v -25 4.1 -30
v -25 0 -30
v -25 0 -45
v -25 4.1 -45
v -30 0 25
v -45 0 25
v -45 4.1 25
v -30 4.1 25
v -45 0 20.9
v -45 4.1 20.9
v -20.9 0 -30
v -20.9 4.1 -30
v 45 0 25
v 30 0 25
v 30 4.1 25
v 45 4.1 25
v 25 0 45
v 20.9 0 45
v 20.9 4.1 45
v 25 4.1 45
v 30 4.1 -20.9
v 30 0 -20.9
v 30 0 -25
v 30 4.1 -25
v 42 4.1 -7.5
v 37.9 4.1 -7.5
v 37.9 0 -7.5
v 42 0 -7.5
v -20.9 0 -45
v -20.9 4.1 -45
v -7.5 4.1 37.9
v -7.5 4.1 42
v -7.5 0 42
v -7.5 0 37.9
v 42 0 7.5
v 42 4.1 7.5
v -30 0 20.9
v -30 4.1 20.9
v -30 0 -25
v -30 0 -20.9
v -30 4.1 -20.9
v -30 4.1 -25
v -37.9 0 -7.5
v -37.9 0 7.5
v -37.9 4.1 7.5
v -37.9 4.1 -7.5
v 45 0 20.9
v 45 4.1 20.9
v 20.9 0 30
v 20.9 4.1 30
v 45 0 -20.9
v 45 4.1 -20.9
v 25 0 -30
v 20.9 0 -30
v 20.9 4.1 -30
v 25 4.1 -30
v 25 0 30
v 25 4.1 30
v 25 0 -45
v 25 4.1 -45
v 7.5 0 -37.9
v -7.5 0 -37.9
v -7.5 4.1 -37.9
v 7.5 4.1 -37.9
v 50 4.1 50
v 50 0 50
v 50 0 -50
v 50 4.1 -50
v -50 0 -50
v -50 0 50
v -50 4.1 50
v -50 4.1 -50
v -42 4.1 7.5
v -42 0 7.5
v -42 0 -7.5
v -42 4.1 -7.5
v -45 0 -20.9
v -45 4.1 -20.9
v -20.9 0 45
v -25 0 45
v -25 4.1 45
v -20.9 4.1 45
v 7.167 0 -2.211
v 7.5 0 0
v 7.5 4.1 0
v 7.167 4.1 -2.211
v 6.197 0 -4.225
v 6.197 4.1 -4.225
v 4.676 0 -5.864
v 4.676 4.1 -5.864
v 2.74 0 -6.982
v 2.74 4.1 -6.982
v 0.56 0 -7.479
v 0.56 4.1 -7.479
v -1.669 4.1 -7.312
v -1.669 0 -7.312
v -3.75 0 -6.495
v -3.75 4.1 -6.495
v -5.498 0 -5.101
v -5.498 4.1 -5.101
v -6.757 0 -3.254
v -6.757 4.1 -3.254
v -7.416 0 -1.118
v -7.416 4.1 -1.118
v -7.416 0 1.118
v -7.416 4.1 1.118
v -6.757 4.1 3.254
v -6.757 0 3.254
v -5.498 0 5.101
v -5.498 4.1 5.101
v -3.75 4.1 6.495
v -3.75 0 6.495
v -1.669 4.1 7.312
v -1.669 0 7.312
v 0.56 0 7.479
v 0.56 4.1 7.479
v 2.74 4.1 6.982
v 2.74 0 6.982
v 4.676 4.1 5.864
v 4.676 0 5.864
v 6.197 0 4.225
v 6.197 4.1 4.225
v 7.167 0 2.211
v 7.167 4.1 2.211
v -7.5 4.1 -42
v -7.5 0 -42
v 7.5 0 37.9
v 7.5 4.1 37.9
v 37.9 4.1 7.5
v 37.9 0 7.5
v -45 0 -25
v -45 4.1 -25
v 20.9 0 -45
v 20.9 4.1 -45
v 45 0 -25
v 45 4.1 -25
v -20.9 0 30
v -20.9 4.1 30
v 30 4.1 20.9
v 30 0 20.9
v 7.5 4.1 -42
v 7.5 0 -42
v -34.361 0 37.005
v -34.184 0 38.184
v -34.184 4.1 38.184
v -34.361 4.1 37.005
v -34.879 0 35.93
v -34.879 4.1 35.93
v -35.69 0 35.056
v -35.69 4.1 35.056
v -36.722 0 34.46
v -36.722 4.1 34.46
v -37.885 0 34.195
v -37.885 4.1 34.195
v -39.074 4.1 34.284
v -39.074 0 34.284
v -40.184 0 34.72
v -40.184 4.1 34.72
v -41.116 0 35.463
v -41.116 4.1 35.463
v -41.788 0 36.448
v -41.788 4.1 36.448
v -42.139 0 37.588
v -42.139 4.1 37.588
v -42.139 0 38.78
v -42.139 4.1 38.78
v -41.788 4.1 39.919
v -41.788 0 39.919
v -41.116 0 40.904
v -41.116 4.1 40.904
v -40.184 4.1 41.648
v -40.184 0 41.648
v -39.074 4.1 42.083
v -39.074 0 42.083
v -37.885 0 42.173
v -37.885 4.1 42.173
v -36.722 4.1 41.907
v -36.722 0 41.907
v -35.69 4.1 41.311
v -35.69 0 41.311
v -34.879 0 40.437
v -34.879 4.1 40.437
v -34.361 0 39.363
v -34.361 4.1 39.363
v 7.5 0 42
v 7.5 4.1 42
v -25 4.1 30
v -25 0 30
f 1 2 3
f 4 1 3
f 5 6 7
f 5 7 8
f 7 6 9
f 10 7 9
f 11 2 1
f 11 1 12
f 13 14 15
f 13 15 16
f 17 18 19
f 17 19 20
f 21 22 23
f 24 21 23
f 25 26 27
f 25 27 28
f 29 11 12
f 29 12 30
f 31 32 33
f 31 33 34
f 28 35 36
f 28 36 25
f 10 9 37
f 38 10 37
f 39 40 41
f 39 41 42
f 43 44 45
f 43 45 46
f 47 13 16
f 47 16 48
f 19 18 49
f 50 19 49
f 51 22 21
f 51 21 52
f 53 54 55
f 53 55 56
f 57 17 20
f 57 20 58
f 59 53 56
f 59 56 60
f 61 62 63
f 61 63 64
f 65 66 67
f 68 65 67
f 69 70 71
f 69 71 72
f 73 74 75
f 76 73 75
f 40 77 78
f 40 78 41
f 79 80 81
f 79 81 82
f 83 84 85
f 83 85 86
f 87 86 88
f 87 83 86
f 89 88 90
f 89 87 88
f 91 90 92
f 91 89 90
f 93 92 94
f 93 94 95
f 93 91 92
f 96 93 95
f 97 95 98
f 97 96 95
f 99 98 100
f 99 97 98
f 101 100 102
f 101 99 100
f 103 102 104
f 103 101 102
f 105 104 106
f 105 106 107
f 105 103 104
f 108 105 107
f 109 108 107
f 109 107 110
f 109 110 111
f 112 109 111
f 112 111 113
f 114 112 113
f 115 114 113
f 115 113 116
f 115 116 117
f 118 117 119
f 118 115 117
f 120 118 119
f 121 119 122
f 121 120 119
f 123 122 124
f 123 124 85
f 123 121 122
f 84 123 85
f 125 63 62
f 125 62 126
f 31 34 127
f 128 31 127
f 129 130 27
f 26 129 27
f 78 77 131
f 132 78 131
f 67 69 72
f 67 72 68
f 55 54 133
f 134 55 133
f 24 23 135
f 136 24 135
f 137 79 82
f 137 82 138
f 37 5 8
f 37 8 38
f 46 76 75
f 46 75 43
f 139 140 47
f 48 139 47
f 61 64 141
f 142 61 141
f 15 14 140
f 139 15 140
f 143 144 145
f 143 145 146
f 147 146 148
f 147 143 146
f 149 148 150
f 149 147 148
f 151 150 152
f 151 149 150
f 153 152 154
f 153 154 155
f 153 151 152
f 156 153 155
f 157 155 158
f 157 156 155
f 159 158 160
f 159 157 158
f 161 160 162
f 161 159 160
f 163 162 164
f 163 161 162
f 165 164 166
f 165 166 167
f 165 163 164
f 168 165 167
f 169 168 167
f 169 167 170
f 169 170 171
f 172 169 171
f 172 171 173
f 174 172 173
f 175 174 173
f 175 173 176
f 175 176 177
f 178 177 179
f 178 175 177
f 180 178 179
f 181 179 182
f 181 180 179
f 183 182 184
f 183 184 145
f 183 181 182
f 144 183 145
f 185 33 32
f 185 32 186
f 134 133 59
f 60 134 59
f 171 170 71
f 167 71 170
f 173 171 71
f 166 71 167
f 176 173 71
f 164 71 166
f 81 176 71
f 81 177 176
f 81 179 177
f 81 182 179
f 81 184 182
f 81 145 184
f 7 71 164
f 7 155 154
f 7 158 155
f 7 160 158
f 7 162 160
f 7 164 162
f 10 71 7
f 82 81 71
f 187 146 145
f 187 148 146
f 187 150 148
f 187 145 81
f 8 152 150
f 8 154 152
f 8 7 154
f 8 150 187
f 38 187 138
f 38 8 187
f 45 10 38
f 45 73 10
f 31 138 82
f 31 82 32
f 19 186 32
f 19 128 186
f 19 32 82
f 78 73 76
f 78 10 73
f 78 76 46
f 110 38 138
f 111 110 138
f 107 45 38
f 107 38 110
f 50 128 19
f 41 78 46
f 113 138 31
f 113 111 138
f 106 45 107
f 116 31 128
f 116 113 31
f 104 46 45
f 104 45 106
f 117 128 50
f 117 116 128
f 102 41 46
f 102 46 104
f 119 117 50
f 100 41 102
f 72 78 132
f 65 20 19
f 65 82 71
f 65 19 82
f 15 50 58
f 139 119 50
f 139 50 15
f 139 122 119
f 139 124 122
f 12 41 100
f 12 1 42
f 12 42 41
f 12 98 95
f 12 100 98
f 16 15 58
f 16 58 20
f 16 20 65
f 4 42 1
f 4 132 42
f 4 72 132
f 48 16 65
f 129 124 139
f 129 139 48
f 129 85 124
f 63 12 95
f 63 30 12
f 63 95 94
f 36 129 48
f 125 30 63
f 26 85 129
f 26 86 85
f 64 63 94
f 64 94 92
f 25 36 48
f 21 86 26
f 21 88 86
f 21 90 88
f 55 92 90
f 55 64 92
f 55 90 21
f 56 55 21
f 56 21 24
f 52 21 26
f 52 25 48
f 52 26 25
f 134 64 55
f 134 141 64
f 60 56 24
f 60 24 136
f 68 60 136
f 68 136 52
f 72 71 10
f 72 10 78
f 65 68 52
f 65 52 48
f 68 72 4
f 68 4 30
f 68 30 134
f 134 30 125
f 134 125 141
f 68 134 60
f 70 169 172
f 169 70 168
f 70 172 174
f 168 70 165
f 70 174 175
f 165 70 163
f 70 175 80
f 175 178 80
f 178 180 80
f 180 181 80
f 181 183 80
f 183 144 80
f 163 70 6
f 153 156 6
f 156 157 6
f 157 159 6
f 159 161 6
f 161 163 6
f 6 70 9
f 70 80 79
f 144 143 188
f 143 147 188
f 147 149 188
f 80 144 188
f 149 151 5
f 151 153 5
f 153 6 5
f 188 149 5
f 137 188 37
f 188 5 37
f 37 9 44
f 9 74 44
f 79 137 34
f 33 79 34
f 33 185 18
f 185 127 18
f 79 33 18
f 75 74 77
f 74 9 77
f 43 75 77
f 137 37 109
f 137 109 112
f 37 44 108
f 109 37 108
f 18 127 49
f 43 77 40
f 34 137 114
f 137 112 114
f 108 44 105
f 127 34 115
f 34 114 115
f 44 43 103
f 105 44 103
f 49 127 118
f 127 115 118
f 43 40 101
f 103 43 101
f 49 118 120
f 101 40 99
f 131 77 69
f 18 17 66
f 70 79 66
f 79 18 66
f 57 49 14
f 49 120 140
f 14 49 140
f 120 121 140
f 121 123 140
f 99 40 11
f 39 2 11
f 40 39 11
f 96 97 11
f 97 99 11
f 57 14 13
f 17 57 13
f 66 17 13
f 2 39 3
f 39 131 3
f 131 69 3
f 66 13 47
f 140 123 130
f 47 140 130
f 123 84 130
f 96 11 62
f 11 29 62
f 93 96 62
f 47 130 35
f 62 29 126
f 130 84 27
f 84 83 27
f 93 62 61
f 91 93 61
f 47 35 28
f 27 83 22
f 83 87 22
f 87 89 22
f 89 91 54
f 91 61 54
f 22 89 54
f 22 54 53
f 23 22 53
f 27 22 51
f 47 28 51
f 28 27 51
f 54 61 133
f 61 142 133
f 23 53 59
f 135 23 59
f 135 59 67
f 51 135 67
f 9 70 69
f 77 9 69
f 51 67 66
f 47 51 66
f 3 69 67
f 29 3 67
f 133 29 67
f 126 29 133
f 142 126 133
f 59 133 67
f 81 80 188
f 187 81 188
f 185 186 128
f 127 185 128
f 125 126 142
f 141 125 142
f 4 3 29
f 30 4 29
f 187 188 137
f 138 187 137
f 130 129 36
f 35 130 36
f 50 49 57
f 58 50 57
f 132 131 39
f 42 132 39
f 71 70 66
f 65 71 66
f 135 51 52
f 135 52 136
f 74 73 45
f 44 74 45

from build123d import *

# Parameters (mm, degrees)
SKETCH1_W           = 100
SKETCH1_H           = 100
SKETCH1_R           = 7.5
SKETCH1_R_2         = 4
SKETCH1_W_2         = 4.1
SKETCH1_H_2         = 15
SKETCH1_W_3         = 15
SKETCH1_H_3         = 4.1
BOSS_EXTRUDE1_DEPTH = 4.1


with BuildPart() as part:
    # Sketch1 → Boss-Extrude1 (new body)
    with BuildSketch(Plane(origin=(0, 0, 0), x_dir=(1, 0, 0), z_dir=(0, 1, 0))):
        Rectangle(SKETCH1_W, SKETCH1_H)
        Circle(SKETCH1_R, mode=Mode.SUBTRACT)
        with Locations((-38.183766184, -38.183766184)):
            Circle(SKETCH1_R_2, mode=Mode.SUBTRACT)
        with Locations((-22.95, 37.5)):
            Rectangle(SKETCH1_W_2, SKETCH1_H_2, mode=Mode.SUBTRACT)
        with Locations((-37.5, 22.95)):
            Rectangle(SKETCH1_W_3, SKETCH1_H_3, mode=Mode.SUBTRACT)
        with Locations((37.5, -22.95)):
            Rectangle(SKETCH1_W_3, SKETCH1_H_3, mode=Mode.SUBTRACT)
        with Locations((22.95, -37.5)):
            Rectangle(SKETCH1_W_2, SKETCH1_H_2, mode=Mode.SUBTRACT)
        with Locations((37.5, 22.95)):
            Rectangle(SKETCH1_W_3, SKETCH1_H_3, mode=Mode.SUBTRACT)
        with Locations((-37.5, -22.95)):
            Rectangle(SKETCH1_W_3, SKETCH1_H_3, mode=Mode.SUBTRACT)
        with Locations((22.95, 37.5)):
            Rectangle(SKETCH1_W_2, SKETCH1_H_2, mode=Mode.SUBTRACT)
        with Locations((-22.95, -37.5)):
            Rectangle(SKETCH1_W_2, SKETCH1_H_2, mode=Mode.SUBTRACT)
        with Locations((0, 39.95)):
            Rectangle(SKETCH1_W_3, SKETCH1_H_3, mode=Mode.SUBTRACT)
        with Locations((0, -39.95)):
            Rectangle(SKETCH1_W_3, SKETCH1_H_3, mode=Mode.SUBTRACT)
        with Locations((39.95, 0)):
            Rectangle(SKETCH1_W_2, SKETCH1_H_2, mode=Mode.SUBTRACT)
        with Locations((-39.95, 0)):
            Rectangle(SKETCH1_W_2, SKETCH1_H_2, mode=Mode.SUBTRACT)
    extrude(amount=BOSS_EXTRUDE1_DEPTH)


solid = part.part
